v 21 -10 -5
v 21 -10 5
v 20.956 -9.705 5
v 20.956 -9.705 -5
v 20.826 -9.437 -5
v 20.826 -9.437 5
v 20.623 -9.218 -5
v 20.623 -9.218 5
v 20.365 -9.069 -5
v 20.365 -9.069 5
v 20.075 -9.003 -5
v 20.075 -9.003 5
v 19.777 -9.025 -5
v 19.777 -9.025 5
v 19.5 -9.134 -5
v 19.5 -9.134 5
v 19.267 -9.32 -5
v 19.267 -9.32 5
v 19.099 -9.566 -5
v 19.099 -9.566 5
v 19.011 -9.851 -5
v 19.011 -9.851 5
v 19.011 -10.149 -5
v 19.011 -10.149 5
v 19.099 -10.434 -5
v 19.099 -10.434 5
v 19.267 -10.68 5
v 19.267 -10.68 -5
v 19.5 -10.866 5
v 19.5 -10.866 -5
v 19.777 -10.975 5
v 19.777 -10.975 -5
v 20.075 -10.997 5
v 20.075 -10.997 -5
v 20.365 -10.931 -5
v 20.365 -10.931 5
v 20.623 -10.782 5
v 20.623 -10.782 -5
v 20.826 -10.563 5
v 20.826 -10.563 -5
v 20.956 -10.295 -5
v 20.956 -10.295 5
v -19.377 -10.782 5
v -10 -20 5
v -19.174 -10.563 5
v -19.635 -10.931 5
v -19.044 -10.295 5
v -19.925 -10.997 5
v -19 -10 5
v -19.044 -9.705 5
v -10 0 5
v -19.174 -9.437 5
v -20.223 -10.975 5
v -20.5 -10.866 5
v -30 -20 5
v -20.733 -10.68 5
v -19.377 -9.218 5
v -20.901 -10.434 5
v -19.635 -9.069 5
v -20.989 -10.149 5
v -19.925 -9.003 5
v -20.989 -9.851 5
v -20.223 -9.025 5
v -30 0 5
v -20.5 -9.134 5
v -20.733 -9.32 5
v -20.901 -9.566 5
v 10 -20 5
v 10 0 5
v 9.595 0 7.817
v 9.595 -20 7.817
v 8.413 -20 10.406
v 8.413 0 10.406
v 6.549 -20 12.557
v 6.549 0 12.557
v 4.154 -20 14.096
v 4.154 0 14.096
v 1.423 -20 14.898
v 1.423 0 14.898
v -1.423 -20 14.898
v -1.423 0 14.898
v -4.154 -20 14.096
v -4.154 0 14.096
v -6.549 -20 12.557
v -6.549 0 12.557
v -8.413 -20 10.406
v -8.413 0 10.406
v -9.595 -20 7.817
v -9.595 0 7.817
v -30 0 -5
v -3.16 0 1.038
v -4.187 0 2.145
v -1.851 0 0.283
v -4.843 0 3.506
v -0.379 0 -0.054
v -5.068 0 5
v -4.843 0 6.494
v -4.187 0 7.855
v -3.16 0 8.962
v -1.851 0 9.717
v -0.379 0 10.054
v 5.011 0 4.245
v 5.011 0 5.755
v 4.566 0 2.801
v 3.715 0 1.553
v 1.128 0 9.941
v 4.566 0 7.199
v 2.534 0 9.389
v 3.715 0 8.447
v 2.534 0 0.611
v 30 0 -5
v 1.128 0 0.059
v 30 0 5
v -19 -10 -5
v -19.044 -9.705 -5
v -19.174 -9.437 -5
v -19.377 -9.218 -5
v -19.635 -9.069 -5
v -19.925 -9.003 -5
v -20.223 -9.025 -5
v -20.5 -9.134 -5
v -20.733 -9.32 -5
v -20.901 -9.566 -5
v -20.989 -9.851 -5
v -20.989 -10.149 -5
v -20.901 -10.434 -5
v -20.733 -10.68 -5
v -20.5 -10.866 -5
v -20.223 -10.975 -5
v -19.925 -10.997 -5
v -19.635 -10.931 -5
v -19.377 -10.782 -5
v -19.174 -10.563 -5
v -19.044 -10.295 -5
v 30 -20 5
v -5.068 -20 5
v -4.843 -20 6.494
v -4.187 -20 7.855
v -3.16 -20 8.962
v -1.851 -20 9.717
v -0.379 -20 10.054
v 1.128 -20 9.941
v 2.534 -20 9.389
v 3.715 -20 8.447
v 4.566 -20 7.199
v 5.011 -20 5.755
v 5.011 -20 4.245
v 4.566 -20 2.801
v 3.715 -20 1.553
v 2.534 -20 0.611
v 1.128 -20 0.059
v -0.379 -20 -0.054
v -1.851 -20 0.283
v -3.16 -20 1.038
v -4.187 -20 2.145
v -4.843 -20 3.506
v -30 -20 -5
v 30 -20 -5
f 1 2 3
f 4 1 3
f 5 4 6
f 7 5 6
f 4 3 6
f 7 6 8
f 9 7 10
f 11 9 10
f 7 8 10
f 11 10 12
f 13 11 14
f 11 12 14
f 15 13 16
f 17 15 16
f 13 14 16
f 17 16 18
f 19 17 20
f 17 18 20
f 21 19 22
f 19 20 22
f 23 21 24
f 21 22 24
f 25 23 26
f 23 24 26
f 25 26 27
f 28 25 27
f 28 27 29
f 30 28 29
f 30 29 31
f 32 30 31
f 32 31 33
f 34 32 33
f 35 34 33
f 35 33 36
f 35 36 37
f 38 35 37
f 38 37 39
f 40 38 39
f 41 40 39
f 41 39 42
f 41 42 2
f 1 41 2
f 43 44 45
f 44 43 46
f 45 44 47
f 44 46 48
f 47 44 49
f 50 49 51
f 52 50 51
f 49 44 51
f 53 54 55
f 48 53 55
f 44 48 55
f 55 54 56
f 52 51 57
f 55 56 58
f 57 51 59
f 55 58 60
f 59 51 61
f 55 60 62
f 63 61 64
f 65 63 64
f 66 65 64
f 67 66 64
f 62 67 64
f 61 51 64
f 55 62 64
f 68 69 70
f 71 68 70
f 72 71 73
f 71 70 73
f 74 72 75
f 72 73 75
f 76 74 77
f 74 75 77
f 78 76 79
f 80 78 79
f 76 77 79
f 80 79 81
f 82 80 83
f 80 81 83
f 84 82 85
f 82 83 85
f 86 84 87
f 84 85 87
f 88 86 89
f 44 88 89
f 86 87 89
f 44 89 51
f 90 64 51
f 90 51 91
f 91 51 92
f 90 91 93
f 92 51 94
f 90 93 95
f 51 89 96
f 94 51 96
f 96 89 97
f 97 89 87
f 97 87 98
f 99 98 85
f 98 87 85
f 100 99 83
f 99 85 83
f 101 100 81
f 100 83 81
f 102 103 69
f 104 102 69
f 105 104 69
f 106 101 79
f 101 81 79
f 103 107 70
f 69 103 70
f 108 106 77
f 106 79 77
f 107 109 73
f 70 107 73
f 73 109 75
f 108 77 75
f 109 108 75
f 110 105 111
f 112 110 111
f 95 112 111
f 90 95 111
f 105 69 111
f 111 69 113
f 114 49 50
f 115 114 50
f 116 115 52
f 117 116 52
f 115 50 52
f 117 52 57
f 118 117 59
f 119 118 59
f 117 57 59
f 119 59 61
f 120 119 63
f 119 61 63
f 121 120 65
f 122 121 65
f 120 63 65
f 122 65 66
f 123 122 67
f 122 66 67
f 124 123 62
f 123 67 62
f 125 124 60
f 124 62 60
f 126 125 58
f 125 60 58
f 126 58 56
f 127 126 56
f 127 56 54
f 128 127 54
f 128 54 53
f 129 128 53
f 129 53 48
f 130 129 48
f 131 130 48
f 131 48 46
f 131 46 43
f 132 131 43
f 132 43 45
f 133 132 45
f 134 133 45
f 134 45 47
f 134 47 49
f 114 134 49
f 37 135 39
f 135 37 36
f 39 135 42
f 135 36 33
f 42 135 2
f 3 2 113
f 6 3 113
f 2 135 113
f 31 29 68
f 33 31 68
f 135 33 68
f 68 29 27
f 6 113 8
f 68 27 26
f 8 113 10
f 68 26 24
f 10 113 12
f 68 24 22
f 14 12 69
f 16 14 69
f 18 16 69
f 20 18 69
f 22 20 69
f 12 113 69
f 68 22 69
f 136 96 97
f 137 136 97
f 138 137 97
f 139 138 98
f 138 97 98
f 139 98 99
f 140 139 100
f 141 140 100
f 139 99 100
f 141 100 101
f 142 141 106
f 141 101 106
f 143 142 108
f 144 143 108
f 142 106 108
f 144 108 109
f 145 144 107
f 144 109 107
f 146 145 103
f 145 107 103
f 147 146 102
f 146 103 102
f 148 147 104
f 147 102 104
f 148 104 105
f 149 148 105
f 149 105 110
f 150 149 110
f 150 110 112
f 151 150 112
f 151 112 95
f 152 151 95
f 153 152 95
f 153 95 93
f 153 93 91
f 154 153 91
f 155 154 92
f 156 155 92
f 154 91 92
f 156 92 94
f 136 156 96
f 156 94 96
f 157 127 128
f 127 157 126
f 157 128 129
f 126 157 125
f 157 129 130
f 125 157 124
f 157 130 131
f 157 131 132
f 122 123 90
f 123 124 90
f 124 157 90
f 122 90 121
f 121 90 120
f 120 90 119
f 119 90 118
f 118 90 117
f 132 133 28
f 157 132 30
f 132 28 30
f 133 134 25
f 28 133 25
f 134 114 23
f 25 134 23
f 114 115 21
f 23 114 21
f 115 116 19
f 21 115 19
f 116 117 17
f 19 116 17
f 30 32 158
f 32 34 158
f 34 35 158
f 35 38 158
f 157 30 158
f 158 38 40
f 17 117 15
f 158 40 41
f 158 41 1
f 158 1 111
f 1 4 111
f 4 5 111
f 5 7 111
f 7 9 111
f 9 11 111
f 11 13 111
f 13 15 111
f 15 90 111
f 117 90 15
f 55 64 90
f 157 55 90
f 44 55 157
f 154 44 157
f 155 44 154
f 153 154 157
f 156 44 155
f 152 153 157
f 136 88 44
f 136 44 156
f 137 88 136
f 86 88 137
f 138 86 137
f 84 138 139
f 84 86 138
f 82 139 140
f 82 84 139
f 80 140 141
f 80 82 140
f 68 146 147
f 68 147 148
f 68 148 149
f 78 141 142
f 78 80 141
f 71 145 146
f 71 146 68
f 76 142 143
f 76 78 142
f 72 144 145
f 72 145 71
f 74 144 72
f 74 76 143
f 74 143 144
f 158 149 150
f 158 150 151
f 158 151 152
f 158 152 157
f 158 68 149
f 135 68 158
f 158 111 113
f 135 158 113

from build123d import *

# Parameters (mm, degrees)
F1_DEPTH = 20
F2_R     = 1
F3_DEPTH = 25
F4_R     = 1
F5_DEPTH = 25


with BuildPart() as f1:
    # F0 (on Front) → F1 (new body)
    with BuildSketch(Plane.XZ):
        with BuildLine():
            Line((30, -5), (30, 5))
            Line((30, 5), (10, 5))
            ThreePointArc((10, 5), (7.0710678119, -2.0710678119), (0, -5))
            Line((0, -5), (30, -5))
        make_face()
        with BuildLine():
            ThreePointArc((0, -5), (-7.0710678119, -2.0710678119), (-10, 5))
            Line((-10, 5), (-30, 5))
            Line((-30, 5), (-30, -5))
            Line((-30, -5), (0, -5))
        make_face()
        with BuildLine():
            ThreePointArc((0, -5), (7.0710678119, -2.0710678119), (10, 5))
            Line((10, 5), (5.0676797819, 5))
            ThreePointArc((5.0676797819, 5), (0, -0.0676797819), (-5.0676797819, 5))
            Line((-5.0676797819, 5), (-10, 5))
            ThreePointArc((-10, 5), (-7.0710678119, -2.0710678119), (0, -5))
        make_face()
        with BuildLine():
            Line((5.0676797819, 5), (10, 5))
            ThreePointArc((10, 5), (0, 15), (-10, 5))
            Line((-10, 5), (-5.0676797819, 5))
            ThreePointArc((-5.0676797819, 5), (0, 10.0676797819), (5.0676797819, 5))
        make_face()
    extrude(amount=F1_DEPTH)

    # F2 (on face) → F3 (cut)
    with BuildSketch(Plane.XY.offset(5)):
        with Locations((-20, -10)):
            Circle(F2_R)
    extrude(amount=-F3_DEPTH, mode=Mode.SUBTRACT)

    # F4 (on face) → F5 (cut)
    with BuildSketch(Plane.XY.offset(5)):
        with Locations((20, -10)):
            Circle(F4_R)
    extrude(amount=-F5_DEPTH, mode=Mode.SUBTRACT)


solid = f1.part
